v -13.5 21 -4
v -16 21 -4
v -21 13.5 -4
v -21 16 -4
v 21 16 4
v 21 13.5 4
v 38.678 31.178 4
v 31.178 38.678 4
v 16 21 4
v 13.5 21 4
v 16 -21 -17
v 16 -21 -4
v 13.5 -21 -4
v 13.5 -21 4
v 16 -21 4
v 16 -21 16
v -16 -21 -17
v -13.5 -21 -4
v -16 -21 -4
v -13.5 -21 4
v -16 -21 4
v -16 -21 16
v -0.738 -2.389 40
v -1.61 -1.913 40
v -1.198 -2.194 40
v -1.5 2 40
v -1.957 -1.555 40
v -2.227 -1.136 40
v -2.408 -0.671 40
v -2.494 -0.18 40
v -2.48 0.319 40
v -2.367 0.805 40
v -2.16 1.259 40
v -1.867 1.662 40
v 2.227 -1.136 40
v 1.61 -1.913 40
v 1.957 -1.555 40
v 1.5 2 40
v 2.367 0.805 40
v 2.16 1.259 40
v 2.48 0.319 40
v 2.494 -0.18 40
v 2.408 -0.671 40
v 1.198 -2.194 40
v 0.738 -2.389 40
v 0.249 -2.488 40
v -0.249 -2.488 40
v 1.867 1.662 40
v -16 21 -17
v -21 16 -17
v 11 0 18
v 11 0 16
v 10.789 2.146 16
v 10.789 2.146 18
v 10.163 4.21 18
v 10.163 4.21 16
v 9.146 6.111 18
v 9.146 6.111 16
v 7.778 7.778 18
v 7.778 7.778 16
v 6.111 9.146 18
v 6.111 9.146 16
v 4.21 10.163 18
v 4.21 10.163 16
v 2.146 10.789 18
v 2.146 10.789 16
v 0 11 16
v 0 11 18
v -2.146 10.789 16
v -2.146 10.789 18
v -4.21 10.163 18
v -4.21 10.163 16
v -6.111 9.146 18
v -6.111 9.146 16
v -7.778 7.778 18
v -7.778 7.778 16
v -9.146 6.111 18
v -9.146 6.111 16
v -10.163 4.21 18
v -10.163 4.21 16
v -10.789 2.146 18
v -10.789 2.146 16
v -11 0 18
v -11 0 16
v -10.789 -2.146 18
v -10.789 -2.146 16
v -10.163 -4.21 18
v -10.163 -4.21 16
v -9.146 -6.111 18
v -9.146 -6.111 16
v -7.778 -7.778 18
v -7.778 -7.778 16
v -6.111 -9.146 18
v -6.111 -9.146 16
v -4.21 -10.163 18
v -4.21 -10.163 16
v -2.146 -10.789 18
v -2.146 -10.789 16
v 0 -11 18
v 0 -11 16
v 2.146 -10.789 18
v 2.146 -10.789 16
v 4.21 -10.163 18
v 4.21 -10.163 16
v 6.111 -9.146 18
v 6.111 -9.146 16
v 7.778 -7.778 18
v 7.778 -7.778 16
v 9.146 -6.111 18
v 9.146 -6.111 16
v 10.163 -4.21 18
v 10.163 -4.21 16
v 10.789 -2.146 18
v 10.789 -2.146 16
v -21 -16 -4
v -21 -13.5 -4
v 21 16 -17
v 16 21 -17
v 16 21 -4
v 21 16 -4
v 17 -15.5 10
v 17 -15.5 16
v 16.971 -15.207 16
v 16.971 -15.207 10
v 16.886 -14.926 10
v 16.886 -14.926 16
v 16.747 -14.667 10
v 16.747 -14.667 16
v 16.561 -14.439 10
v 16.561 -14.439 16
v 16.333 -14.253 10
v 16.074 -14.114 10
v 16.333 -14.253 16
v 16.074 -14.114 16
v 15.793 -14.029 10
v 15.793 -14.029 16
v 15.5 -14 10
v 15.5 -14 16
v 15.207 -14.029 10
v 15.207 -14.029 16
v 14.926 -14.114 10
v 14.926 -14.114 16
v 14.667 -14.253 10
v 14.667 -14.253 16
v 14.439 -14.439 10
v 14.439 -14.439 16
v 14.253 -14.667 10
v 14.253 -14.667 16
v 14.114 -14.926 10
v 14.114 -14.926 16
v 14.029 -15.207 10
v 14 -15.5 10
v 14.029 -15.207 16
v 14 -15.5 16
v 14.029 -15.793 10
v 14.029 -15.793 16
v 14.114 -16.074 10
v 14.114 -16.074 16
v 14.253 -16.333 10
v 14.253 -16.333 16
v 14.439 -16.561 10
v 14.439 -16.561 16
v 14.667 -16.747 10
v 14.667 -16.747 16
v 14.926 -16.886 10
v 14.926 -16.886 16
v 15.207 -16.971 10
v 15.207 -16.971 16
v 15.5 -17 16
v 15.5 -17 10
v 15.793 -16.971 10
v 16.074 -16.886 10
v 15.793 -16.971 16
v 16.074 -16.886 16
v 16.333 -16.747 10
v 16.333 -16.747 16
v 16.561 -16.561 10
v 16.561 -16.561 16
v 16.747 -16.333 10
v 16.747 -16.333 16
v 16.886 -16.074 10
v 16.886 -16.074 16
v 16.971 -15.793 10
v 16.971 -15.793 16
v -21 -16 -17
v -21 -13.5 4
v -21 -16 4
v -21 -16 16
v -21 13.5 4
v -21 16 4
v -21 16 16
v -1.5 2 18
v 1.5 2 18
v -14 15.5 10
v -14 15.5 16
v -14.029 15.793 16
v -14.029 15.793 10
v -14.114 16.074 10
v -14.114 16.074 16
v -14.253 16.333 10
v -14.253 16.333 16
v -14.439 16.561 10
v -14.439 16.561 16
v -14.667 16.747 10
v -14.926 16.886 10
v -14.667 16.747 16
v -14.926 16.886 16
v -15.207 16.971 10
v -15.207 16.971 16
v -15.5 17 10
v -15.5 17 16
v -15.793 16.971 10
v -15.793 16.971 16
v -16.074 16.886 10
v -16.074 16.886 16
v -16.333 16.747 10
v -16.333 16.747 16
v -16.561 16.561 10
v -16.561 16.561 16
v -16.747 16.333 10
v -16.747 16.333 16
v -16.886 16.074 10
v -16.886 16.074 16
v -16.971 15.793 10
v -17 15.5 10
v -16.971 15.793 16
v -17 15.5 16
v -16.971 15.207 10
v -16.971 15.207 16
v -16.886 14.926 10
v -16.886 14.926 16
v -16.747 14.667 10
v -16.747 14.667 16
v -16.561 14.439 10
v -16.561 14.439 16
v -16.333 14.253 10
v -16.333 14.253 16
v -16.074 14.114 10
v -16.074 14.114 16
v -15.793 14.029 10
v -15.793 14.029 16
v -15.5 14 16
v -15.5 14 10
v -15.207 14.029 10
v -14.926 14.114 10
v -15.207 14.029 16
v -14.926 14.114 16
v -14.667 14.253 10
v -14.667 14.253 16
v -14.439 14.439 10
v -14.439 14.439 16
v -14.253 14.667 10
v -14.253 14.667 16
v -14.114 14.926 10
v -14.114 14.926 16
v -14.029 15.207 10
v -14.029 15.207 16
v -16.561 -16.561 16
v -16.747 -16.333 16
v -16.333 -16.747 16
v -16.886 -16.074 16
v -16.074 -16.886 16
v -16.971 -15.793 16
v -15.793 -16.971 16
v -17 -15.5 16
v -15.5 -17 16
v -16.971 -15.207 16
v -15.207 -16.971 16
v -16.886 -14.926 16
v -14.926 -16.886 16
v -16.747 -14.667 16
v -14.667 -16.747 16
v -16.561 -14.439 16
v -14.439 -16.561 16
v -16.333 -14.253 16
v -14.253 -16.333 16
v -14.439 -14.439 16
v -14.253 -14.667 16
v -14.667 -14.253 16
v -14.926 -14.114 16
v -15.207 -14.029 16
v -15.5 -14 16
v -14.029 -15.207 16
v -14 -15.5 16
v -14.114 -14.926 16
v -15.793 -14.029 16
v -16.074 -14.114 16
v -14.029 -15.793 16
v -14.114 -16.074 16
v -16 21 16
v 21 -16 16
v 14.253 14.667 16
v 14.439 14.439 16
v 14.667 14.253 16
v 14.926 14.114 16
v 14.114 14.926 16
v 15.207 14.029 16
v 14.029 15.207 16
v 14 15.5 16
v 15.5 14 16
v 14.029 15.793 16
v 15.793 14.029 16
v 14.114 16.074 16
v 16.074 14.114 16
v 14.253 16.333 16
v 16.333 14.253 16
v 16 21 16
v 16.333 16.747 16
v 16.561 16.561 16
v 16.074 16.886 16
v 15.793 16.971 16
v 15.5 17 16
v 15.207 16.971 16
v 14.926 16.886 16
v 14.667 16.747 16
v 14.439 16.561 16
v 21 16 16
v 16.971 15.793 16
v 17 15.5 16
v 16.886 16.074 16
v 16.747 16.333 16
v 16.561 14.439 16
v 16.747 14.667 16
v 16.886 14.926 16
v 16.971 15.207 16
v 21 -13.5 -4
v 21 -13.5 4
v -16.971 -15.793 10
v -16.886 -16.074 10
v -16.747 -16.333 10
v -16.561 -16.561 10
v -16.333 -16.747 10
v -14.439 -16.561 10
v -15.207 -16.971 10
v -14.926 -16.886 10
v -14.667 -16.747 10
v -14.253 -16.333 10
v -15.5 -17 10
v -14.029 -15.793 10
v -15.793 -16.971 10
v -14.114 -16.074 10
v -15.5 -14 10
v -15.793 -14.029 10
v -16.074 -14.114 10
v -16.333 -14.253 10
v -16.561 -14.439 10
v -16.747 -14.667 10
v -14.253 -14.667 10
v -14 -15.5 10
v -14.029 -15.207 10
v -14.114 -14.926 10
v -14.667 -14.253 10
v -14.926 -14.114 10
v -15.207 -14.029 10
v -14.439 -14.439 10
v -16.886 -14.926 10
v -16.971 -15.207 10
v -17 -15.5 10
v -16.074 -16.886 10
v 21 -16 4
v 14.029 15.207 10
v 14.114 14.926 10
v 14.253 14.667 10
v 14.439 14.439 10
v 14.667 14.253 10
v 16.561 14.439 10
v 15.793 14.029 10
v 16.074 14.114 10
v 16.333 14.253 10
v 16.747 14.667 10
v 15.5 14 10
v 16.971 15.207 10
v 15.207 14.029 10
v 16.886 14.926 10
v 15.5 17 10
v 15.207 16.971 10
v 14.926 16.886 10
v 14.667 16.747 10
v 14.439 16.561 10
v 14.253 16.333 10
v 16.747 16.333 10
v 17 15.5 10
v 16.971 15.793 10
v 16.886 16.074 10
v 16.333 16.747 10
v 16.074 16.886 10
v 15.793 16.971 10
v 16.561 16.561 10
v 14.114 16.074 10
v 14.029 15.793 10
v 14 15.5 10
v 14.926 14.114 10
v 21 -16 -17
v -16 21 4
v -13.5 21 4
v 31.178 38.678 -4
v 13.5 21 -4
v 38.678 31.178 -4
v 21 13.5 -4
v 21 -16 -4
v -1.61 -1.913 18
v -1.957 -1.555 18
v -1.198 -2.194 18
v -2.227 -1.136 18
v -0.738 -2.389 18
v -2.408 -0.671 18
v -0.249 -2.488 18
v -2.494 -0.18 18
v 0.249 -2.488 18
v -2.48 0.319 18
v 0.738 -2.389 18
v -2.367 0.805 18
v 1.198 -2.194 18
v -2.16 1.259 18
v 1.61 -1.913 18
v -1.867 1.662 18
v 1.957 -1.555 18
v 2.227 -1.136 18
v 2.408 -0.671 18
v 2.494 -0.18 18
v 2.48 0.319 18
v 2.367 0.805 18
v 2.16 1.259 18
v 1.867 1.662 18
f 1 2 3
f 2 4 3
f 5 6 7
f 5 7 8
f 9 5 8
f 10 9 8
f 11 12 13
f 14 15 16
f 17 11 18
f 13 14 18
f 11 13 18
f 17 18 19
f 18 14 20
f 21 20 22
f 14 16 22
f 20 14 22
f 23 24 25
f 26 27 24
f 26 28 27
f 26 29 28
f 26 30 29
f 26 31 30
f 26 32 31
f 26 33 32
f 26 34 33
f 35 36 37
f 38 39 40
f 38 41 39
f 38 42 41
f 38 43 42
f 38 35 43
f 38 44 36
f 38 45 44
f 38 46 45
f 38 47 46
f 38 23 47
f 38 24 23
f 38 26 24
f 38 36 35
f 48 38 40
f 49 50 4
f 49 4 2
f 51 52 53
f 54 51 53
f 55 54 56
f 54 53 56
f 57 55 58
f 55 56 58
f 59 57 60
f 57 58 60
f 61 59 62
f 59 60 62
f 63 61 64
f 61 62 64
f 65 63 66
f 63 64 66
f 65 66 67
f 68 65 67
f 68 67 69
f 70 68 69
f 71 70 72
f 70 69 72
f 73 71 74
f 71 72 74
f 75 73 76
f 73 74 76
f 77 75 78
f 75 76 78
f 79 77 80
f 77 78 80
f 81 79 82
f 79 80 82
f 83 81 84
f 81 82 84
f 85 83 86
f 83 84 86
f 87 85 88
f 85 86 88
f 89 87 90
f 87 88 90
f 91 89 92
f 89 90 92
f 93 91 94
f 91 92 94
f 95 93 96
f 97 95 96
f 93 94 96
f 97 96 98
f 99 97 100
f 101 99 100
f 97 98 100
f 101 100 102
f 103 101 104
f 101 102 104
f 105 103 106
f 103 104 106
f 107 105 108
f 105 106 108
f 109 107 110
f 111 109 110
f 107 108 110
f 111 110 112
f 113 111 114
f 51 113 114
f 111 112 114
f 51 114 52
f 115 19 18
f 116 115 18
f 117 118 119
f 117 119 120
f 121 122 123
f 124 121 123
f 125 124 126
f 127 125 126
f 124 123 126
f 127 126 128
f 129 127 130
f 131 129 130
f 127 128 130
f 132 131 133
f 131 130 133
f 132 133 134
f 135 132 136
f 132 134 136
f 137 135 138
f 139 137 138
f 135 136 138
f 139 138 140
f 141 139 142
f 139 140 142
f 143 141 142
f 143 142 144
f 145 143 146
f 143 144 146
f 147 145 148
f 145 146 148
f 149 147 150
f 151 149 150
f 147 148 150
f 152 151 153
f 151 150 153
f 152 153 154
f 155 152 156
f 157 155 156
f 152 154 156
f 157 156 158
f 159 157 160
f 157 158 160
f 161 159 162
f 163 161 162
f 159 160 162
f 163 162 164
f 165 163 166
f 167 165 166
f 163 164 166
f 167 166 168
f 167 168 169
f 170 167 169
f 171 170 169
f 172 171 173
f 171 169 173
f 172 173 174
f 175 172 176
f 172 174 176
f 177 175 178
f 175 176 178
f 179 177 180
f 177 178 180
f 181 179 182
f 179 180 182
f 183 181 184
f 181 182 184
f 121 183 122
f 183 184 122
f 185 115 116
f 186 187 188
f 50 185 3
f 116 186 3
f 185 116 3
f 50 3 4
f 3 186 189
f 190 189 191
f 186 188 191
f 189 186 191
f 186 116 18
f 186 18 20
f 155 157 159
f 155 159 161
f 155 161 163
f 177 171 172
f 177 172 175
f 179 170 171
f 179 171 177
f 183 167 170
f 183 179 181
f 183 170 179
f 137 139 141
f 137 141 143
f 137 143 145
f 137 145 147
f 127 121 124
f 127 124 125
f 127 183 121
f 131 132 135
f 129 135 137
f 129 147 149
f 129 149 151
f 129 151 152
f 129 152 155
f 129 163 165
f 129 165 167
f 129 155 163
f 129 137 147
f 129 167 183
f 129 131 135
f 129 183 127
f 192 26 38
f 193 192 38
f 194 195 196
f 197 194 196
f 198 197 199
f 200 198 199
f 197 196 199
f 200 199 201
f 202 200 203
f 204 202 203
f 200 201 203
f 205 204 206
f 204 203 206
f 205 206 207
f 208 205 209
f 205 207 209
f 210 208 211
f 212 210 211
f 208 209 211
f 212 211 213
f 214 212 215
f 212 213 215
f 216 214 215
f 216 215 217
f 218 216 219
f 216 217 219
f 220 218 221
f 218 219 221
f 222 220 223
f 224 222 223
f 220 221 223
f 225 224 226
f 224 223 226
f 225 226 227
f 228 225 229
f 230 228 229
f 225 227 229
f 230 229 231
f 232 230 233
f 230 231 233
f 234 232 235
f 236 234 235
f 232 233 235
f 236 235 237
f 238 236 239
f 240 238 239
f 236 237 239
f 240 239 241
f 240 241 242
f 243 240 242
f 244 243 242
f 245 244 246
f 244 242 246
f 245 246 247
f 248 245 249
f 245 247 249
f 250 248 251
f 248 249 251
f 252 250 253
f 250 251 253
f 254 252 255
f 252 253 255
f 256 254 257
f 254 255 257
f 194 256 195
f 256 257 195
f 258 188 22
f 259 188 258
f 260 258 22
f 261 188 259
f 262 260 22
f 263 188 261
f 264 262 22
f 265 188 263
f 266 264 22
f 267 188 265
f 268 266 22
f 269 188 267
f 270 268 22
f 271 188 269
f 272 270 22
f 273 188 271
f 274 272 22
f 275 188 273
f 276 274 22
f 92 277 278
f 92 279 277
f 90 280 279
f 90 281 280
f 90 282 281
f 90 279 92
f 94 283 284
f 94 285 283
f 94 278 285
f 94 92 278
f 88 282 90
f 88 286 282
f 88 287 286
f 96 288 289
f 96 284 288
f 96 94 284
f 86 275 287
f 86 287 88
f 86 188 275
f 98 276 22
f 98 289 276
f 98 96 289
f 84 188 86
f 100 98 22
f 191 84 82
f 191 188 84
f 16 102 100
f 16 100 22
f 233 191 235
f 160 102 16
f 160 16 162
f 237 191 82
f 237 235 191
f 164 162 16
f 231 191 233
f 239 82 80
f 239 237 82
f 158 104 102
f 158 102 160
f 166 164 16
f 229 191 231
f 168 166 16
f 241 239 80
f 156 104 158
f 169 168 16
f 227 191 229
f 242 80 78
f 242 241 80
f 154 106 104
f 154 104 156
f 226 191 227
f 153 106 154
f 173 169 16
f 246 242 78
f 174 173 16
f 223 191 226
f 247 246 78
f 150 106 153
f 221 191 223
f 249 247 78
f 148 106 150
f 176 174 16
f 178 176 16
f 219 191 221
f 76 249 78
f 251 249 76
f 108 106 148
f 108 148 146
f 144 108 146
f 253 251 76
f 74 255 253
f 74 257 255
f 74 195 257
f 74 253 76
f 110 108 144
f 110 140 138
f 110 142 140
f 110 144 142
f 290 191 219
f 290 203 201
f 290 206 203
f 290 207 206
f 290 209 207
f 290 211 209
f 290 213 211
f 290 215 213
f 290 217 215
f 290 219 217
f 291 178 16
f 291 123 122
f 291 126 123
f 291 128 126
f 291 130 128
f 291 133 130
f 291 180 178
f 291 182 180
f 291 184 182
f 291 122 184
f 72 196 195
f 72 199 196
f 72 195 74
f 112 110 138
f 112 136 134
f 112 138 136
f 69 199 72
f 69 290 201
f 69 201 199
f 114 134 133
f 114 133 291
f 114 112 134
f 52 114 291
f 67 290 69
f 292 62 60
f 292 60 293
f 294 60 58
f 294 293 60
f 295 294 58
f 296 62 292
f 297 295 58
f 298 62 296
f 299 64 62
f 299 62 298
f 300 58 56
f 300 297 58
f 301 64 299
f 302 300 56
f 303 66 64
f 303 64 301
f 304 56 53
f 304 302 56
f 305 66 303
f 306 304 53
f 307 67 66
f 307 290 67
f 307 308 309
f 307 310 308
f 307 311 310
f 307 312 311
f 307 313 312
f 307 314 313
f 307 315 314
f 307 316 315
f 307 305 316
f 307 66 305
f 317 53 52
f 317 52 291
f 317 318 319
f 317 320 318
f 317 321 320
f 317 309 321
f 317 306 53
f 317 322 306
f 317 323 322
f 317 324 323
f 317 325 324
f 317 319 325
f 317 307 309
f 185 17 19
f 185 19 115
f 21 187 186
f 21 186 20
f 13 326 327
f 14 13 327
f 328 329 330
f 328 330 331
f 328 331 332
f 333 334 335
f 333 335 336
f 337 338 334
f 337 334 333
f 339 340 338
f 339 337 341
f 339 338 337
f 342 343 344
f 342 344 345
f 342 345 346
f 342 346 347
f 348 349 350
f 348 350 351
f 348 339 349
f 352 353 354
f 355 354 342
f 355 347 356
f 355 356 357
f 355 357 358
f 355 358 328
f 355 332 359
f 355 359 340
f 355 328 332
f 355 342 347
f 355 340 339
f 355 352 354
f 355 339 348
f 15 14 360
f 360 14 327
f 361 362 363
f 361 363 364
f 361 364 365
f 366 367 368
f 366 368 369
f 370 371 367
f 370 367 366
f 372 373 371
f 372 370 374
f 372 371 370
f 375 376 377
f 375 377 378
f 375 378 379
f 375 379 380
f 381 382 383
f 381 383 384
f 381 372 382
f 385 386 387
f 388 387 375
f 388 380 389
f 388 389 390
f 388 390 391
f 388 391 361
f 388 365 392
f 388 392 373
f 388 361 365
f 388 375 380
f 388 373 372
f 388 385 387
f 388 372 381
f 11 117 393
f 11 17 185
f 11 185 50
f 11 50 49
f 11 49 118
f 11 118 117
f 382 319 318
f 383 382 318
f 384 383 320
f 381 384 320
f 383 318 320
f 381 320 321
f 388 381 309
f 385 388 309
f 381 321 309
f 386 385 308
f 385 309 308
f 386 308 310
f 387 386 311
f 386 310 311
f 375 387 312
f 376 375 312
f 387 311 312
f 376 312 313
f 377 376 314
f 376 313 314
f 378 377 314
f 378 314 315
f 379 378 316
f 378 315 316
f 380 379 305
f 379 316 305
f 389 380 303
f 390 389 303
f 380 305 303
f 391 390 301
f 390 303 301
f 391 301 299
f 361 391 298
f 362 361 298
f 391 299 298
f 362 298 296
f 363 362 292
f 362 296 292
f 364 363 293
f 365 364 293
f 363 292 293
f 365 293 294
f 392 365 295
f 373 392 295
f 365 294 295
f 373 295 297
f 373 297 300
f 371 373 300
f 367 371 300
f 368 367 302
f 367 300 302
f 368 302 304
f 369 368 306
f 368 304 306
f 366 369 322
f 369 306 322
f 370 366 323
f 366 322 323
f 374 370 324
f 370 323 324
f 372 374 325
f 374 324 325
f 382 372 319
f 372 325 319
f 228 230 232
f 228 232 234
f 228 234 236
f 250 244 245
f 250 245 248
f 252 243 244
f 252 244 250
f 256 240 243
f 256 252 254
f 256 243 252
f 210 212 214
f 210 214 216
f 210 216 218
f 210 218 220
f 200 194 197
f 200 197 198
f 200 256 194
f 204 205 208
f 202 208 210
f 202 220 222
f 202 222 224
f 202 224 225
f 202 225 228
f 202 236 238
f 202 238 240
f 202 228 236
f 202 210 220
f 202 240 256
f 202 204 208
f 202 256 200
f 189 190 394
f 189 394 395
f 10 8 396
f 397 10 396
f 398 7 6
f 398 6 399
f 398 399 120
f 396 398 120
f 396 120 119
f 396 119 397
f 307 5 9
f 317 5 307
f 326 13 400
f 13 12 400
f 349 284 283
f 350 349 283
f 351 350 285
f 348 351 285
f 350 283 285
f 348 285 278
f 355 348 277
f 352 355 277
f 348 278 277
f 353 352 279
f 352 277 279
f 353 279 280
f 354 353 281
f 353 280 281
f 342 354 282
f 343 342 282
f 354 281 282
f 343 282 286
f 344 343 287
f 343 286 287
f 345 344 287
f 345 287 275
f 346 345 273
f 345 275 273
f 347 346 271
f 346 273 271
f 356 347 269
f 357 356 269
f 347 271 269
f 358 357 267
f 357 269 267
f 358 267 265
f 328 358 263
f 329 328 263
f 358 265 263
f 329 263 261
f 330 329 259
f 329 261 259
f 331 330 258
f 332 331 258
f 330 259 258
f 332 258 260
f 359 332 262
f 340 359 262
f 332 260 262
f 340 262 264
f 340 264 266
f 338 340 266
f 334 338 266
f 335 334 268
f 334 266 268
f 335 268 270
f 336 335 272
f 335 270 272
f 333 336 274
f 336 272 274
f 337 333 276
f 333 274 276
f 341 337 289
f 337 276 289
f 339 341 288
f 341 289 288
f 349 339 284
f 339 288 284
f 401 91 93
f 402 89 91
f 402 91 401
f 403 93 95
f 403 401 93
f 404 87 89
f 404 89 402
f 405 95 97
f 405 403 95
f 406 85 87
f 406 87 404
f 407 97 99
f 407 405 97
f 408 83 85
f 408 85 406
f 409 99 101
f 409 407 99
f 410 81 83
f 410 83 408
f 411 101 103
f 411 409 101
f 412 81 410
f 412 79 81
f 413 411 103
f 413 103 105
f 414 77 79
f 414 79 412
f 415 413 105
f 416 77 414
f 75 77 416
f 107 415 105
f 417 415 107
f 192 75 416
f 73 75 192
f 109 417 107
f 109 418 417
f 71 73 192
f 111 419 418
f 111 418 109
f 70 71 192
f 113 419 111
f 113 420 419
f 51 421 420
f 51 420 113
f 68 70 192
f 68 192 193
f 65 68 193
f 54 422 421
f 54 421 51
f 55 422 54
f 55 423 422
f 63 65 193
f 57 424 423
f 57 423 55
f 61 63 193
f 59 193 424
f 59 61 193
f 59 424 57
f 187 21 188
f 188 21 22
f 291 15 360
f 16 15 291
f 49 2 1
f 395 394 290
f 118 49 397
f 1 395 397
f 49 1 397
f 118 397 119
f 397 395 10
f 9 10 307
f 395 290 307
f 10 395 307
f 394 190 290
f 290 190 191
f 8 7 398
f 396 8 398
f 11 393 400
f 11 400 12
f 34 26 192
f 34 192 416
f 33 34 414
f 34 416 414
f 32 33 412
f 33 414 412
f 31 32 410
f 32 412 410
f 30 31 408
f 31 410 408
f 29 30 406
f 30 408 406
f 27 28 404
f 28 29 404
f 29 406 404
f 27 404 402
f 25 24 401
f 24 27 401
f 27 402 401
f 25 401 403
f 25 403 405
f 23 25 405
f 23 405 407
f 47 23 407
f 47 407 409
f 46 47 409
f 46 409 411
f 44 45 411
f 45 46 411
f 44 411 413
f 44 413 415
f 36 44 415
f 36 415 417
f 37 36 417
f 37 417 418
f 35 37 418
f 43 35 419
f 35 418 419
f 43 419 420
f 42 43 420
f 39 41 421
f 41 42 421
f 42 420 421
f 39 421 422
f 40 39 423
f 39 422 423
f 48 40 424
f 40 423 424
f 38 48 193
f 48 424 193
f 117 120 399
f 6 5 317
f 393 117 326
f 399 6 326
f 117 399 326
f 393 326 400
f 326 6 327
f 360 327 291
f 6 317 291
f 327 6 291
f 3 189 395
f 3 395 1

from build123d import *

# Parameters (mm, degrees)
F0_W      = 42
F0_H      = 42
F1_DEPTH  = 4
F2_SIZE   = 7.5
F4_DEPTH  = 12
F5_SIZE   = 5
F7_DEPTH  = 13
F8_R      = 11
F9_DEPTH  = 2
F10_R     = 2.5
F11_DEPTH = 22
F12_W     = 5.2537292178
F12_H     = 0.9334036984
F13_DEPTH = 22
F14_R     = 1.5
F15_DEPTH = 6
F16_DEPTH = 25


with BuildPart() as f1:
    # F0 (on Top) → F1 (new body, symmetric)
    with BuildSketch(Plane.XY):
        Rectangle(F0_W, F0_H)
    extrude(amount=F1_DEPTH, both=True)

    # F2
    f2_edges = [f1.edges().sort_by_distance(p)[0] for p in [
        (21, 21, 0),
        (-21, 21, 0),
        (-21, -21, 0),
        (21, -21, 0),
    ]]
    chamfer(f2_edges, length=F2_SIZE)

    # F3 (on face) → F4 (join)
    with BuildSketch(Plane.XY.offset(4)):
        Polygon((13.5, 21), (-13.5, 21), (-21, 13.5), (-21, -13.5), (-13.5, -21), (13.5, -21), (21, -13.5), (21, 13.5), align=None)
        Polygon((21, 21), (13.5, 21), (21, 13.5), align=None)
        Polygon((-13.5, 21), (-21, 21), (-21, 13.5), align=None)
        Polygon((-13.5, -21), (-21, -13.5), (-21, -21), align=None)
        Polygon((21, -21), (21, -13.5), (13.5, -21), align=None)
    extrude(amount=F4_DEPTH)

    # F5
    f5_edges = [f1.edges().sort_by_distance(p)[0] for p in [
        (21, -21, 10),
        (-21, -21, 10),
        (-21, 21, 10),
        (21, 21, 10),
    ]]
    chamfer(f5_edges, length=F5_SIZE)

    # F6 (on face) → F7 (join)
    with BuildSketch(Plane(origin=(0, 0, -4), x_dir=(1, 0, 0), z_dir=(0, 0, -1))):
        Polygon((21, -16), (21, 16), (16, 21), (-16, 21), (-21, 16), (-21, -16), (-16, -21), (16, -21), align=None)
    extrude(amount=F7_DEPTH)

    # F8 (on face) → F9 (join)
    with BuildSketch(Plane.XY.offset(16)):
        Circle(F8_R)
    extrude(amount=F9_DEPTH)

    # F10 (on face) → F11 (join)
    with BuildSketch(Plane.XY.offset(18)):
        Circle(F10_R)
    extrude(amount=F11_DEPTH)

    # F12 (on face) → F13 (cut)
    with BuildSketch(Plane.XY.offset(40)):
        with Locations((-0.0065014465, 2.4667018492)):
            Rectangle(F12_W, F12_H)
    extrude(amount=-F13_DEPTH, mode=Mode.SUBTRACT)

    # F14 (on face) → F15 (cut)
    with BuildSketch(Plane.XY.offset(16)):
        with Locations((-15.5, 15.5)):
            Circle(F14_R)
        with Locations((15.5, 15.5)):
            Circle(F14_R)
        with Locations((-15.5, -15.5)):
            Circle(F14_R)
        with Locations((15.5, -15.5)):
            Circle(F14_R)
    extrude(amount=-F15_DEPTH, mode=Mode.SUBTRACT)

    # F16 (add): a face of the model
    f16_faces = [f1.faces().sort_by_distance(p)[0] for p in [
        (17.25, 17.25, 0),
    ]]
    extrude(f16_faces, amount=F16_DEPTH)


solid = f1.part
